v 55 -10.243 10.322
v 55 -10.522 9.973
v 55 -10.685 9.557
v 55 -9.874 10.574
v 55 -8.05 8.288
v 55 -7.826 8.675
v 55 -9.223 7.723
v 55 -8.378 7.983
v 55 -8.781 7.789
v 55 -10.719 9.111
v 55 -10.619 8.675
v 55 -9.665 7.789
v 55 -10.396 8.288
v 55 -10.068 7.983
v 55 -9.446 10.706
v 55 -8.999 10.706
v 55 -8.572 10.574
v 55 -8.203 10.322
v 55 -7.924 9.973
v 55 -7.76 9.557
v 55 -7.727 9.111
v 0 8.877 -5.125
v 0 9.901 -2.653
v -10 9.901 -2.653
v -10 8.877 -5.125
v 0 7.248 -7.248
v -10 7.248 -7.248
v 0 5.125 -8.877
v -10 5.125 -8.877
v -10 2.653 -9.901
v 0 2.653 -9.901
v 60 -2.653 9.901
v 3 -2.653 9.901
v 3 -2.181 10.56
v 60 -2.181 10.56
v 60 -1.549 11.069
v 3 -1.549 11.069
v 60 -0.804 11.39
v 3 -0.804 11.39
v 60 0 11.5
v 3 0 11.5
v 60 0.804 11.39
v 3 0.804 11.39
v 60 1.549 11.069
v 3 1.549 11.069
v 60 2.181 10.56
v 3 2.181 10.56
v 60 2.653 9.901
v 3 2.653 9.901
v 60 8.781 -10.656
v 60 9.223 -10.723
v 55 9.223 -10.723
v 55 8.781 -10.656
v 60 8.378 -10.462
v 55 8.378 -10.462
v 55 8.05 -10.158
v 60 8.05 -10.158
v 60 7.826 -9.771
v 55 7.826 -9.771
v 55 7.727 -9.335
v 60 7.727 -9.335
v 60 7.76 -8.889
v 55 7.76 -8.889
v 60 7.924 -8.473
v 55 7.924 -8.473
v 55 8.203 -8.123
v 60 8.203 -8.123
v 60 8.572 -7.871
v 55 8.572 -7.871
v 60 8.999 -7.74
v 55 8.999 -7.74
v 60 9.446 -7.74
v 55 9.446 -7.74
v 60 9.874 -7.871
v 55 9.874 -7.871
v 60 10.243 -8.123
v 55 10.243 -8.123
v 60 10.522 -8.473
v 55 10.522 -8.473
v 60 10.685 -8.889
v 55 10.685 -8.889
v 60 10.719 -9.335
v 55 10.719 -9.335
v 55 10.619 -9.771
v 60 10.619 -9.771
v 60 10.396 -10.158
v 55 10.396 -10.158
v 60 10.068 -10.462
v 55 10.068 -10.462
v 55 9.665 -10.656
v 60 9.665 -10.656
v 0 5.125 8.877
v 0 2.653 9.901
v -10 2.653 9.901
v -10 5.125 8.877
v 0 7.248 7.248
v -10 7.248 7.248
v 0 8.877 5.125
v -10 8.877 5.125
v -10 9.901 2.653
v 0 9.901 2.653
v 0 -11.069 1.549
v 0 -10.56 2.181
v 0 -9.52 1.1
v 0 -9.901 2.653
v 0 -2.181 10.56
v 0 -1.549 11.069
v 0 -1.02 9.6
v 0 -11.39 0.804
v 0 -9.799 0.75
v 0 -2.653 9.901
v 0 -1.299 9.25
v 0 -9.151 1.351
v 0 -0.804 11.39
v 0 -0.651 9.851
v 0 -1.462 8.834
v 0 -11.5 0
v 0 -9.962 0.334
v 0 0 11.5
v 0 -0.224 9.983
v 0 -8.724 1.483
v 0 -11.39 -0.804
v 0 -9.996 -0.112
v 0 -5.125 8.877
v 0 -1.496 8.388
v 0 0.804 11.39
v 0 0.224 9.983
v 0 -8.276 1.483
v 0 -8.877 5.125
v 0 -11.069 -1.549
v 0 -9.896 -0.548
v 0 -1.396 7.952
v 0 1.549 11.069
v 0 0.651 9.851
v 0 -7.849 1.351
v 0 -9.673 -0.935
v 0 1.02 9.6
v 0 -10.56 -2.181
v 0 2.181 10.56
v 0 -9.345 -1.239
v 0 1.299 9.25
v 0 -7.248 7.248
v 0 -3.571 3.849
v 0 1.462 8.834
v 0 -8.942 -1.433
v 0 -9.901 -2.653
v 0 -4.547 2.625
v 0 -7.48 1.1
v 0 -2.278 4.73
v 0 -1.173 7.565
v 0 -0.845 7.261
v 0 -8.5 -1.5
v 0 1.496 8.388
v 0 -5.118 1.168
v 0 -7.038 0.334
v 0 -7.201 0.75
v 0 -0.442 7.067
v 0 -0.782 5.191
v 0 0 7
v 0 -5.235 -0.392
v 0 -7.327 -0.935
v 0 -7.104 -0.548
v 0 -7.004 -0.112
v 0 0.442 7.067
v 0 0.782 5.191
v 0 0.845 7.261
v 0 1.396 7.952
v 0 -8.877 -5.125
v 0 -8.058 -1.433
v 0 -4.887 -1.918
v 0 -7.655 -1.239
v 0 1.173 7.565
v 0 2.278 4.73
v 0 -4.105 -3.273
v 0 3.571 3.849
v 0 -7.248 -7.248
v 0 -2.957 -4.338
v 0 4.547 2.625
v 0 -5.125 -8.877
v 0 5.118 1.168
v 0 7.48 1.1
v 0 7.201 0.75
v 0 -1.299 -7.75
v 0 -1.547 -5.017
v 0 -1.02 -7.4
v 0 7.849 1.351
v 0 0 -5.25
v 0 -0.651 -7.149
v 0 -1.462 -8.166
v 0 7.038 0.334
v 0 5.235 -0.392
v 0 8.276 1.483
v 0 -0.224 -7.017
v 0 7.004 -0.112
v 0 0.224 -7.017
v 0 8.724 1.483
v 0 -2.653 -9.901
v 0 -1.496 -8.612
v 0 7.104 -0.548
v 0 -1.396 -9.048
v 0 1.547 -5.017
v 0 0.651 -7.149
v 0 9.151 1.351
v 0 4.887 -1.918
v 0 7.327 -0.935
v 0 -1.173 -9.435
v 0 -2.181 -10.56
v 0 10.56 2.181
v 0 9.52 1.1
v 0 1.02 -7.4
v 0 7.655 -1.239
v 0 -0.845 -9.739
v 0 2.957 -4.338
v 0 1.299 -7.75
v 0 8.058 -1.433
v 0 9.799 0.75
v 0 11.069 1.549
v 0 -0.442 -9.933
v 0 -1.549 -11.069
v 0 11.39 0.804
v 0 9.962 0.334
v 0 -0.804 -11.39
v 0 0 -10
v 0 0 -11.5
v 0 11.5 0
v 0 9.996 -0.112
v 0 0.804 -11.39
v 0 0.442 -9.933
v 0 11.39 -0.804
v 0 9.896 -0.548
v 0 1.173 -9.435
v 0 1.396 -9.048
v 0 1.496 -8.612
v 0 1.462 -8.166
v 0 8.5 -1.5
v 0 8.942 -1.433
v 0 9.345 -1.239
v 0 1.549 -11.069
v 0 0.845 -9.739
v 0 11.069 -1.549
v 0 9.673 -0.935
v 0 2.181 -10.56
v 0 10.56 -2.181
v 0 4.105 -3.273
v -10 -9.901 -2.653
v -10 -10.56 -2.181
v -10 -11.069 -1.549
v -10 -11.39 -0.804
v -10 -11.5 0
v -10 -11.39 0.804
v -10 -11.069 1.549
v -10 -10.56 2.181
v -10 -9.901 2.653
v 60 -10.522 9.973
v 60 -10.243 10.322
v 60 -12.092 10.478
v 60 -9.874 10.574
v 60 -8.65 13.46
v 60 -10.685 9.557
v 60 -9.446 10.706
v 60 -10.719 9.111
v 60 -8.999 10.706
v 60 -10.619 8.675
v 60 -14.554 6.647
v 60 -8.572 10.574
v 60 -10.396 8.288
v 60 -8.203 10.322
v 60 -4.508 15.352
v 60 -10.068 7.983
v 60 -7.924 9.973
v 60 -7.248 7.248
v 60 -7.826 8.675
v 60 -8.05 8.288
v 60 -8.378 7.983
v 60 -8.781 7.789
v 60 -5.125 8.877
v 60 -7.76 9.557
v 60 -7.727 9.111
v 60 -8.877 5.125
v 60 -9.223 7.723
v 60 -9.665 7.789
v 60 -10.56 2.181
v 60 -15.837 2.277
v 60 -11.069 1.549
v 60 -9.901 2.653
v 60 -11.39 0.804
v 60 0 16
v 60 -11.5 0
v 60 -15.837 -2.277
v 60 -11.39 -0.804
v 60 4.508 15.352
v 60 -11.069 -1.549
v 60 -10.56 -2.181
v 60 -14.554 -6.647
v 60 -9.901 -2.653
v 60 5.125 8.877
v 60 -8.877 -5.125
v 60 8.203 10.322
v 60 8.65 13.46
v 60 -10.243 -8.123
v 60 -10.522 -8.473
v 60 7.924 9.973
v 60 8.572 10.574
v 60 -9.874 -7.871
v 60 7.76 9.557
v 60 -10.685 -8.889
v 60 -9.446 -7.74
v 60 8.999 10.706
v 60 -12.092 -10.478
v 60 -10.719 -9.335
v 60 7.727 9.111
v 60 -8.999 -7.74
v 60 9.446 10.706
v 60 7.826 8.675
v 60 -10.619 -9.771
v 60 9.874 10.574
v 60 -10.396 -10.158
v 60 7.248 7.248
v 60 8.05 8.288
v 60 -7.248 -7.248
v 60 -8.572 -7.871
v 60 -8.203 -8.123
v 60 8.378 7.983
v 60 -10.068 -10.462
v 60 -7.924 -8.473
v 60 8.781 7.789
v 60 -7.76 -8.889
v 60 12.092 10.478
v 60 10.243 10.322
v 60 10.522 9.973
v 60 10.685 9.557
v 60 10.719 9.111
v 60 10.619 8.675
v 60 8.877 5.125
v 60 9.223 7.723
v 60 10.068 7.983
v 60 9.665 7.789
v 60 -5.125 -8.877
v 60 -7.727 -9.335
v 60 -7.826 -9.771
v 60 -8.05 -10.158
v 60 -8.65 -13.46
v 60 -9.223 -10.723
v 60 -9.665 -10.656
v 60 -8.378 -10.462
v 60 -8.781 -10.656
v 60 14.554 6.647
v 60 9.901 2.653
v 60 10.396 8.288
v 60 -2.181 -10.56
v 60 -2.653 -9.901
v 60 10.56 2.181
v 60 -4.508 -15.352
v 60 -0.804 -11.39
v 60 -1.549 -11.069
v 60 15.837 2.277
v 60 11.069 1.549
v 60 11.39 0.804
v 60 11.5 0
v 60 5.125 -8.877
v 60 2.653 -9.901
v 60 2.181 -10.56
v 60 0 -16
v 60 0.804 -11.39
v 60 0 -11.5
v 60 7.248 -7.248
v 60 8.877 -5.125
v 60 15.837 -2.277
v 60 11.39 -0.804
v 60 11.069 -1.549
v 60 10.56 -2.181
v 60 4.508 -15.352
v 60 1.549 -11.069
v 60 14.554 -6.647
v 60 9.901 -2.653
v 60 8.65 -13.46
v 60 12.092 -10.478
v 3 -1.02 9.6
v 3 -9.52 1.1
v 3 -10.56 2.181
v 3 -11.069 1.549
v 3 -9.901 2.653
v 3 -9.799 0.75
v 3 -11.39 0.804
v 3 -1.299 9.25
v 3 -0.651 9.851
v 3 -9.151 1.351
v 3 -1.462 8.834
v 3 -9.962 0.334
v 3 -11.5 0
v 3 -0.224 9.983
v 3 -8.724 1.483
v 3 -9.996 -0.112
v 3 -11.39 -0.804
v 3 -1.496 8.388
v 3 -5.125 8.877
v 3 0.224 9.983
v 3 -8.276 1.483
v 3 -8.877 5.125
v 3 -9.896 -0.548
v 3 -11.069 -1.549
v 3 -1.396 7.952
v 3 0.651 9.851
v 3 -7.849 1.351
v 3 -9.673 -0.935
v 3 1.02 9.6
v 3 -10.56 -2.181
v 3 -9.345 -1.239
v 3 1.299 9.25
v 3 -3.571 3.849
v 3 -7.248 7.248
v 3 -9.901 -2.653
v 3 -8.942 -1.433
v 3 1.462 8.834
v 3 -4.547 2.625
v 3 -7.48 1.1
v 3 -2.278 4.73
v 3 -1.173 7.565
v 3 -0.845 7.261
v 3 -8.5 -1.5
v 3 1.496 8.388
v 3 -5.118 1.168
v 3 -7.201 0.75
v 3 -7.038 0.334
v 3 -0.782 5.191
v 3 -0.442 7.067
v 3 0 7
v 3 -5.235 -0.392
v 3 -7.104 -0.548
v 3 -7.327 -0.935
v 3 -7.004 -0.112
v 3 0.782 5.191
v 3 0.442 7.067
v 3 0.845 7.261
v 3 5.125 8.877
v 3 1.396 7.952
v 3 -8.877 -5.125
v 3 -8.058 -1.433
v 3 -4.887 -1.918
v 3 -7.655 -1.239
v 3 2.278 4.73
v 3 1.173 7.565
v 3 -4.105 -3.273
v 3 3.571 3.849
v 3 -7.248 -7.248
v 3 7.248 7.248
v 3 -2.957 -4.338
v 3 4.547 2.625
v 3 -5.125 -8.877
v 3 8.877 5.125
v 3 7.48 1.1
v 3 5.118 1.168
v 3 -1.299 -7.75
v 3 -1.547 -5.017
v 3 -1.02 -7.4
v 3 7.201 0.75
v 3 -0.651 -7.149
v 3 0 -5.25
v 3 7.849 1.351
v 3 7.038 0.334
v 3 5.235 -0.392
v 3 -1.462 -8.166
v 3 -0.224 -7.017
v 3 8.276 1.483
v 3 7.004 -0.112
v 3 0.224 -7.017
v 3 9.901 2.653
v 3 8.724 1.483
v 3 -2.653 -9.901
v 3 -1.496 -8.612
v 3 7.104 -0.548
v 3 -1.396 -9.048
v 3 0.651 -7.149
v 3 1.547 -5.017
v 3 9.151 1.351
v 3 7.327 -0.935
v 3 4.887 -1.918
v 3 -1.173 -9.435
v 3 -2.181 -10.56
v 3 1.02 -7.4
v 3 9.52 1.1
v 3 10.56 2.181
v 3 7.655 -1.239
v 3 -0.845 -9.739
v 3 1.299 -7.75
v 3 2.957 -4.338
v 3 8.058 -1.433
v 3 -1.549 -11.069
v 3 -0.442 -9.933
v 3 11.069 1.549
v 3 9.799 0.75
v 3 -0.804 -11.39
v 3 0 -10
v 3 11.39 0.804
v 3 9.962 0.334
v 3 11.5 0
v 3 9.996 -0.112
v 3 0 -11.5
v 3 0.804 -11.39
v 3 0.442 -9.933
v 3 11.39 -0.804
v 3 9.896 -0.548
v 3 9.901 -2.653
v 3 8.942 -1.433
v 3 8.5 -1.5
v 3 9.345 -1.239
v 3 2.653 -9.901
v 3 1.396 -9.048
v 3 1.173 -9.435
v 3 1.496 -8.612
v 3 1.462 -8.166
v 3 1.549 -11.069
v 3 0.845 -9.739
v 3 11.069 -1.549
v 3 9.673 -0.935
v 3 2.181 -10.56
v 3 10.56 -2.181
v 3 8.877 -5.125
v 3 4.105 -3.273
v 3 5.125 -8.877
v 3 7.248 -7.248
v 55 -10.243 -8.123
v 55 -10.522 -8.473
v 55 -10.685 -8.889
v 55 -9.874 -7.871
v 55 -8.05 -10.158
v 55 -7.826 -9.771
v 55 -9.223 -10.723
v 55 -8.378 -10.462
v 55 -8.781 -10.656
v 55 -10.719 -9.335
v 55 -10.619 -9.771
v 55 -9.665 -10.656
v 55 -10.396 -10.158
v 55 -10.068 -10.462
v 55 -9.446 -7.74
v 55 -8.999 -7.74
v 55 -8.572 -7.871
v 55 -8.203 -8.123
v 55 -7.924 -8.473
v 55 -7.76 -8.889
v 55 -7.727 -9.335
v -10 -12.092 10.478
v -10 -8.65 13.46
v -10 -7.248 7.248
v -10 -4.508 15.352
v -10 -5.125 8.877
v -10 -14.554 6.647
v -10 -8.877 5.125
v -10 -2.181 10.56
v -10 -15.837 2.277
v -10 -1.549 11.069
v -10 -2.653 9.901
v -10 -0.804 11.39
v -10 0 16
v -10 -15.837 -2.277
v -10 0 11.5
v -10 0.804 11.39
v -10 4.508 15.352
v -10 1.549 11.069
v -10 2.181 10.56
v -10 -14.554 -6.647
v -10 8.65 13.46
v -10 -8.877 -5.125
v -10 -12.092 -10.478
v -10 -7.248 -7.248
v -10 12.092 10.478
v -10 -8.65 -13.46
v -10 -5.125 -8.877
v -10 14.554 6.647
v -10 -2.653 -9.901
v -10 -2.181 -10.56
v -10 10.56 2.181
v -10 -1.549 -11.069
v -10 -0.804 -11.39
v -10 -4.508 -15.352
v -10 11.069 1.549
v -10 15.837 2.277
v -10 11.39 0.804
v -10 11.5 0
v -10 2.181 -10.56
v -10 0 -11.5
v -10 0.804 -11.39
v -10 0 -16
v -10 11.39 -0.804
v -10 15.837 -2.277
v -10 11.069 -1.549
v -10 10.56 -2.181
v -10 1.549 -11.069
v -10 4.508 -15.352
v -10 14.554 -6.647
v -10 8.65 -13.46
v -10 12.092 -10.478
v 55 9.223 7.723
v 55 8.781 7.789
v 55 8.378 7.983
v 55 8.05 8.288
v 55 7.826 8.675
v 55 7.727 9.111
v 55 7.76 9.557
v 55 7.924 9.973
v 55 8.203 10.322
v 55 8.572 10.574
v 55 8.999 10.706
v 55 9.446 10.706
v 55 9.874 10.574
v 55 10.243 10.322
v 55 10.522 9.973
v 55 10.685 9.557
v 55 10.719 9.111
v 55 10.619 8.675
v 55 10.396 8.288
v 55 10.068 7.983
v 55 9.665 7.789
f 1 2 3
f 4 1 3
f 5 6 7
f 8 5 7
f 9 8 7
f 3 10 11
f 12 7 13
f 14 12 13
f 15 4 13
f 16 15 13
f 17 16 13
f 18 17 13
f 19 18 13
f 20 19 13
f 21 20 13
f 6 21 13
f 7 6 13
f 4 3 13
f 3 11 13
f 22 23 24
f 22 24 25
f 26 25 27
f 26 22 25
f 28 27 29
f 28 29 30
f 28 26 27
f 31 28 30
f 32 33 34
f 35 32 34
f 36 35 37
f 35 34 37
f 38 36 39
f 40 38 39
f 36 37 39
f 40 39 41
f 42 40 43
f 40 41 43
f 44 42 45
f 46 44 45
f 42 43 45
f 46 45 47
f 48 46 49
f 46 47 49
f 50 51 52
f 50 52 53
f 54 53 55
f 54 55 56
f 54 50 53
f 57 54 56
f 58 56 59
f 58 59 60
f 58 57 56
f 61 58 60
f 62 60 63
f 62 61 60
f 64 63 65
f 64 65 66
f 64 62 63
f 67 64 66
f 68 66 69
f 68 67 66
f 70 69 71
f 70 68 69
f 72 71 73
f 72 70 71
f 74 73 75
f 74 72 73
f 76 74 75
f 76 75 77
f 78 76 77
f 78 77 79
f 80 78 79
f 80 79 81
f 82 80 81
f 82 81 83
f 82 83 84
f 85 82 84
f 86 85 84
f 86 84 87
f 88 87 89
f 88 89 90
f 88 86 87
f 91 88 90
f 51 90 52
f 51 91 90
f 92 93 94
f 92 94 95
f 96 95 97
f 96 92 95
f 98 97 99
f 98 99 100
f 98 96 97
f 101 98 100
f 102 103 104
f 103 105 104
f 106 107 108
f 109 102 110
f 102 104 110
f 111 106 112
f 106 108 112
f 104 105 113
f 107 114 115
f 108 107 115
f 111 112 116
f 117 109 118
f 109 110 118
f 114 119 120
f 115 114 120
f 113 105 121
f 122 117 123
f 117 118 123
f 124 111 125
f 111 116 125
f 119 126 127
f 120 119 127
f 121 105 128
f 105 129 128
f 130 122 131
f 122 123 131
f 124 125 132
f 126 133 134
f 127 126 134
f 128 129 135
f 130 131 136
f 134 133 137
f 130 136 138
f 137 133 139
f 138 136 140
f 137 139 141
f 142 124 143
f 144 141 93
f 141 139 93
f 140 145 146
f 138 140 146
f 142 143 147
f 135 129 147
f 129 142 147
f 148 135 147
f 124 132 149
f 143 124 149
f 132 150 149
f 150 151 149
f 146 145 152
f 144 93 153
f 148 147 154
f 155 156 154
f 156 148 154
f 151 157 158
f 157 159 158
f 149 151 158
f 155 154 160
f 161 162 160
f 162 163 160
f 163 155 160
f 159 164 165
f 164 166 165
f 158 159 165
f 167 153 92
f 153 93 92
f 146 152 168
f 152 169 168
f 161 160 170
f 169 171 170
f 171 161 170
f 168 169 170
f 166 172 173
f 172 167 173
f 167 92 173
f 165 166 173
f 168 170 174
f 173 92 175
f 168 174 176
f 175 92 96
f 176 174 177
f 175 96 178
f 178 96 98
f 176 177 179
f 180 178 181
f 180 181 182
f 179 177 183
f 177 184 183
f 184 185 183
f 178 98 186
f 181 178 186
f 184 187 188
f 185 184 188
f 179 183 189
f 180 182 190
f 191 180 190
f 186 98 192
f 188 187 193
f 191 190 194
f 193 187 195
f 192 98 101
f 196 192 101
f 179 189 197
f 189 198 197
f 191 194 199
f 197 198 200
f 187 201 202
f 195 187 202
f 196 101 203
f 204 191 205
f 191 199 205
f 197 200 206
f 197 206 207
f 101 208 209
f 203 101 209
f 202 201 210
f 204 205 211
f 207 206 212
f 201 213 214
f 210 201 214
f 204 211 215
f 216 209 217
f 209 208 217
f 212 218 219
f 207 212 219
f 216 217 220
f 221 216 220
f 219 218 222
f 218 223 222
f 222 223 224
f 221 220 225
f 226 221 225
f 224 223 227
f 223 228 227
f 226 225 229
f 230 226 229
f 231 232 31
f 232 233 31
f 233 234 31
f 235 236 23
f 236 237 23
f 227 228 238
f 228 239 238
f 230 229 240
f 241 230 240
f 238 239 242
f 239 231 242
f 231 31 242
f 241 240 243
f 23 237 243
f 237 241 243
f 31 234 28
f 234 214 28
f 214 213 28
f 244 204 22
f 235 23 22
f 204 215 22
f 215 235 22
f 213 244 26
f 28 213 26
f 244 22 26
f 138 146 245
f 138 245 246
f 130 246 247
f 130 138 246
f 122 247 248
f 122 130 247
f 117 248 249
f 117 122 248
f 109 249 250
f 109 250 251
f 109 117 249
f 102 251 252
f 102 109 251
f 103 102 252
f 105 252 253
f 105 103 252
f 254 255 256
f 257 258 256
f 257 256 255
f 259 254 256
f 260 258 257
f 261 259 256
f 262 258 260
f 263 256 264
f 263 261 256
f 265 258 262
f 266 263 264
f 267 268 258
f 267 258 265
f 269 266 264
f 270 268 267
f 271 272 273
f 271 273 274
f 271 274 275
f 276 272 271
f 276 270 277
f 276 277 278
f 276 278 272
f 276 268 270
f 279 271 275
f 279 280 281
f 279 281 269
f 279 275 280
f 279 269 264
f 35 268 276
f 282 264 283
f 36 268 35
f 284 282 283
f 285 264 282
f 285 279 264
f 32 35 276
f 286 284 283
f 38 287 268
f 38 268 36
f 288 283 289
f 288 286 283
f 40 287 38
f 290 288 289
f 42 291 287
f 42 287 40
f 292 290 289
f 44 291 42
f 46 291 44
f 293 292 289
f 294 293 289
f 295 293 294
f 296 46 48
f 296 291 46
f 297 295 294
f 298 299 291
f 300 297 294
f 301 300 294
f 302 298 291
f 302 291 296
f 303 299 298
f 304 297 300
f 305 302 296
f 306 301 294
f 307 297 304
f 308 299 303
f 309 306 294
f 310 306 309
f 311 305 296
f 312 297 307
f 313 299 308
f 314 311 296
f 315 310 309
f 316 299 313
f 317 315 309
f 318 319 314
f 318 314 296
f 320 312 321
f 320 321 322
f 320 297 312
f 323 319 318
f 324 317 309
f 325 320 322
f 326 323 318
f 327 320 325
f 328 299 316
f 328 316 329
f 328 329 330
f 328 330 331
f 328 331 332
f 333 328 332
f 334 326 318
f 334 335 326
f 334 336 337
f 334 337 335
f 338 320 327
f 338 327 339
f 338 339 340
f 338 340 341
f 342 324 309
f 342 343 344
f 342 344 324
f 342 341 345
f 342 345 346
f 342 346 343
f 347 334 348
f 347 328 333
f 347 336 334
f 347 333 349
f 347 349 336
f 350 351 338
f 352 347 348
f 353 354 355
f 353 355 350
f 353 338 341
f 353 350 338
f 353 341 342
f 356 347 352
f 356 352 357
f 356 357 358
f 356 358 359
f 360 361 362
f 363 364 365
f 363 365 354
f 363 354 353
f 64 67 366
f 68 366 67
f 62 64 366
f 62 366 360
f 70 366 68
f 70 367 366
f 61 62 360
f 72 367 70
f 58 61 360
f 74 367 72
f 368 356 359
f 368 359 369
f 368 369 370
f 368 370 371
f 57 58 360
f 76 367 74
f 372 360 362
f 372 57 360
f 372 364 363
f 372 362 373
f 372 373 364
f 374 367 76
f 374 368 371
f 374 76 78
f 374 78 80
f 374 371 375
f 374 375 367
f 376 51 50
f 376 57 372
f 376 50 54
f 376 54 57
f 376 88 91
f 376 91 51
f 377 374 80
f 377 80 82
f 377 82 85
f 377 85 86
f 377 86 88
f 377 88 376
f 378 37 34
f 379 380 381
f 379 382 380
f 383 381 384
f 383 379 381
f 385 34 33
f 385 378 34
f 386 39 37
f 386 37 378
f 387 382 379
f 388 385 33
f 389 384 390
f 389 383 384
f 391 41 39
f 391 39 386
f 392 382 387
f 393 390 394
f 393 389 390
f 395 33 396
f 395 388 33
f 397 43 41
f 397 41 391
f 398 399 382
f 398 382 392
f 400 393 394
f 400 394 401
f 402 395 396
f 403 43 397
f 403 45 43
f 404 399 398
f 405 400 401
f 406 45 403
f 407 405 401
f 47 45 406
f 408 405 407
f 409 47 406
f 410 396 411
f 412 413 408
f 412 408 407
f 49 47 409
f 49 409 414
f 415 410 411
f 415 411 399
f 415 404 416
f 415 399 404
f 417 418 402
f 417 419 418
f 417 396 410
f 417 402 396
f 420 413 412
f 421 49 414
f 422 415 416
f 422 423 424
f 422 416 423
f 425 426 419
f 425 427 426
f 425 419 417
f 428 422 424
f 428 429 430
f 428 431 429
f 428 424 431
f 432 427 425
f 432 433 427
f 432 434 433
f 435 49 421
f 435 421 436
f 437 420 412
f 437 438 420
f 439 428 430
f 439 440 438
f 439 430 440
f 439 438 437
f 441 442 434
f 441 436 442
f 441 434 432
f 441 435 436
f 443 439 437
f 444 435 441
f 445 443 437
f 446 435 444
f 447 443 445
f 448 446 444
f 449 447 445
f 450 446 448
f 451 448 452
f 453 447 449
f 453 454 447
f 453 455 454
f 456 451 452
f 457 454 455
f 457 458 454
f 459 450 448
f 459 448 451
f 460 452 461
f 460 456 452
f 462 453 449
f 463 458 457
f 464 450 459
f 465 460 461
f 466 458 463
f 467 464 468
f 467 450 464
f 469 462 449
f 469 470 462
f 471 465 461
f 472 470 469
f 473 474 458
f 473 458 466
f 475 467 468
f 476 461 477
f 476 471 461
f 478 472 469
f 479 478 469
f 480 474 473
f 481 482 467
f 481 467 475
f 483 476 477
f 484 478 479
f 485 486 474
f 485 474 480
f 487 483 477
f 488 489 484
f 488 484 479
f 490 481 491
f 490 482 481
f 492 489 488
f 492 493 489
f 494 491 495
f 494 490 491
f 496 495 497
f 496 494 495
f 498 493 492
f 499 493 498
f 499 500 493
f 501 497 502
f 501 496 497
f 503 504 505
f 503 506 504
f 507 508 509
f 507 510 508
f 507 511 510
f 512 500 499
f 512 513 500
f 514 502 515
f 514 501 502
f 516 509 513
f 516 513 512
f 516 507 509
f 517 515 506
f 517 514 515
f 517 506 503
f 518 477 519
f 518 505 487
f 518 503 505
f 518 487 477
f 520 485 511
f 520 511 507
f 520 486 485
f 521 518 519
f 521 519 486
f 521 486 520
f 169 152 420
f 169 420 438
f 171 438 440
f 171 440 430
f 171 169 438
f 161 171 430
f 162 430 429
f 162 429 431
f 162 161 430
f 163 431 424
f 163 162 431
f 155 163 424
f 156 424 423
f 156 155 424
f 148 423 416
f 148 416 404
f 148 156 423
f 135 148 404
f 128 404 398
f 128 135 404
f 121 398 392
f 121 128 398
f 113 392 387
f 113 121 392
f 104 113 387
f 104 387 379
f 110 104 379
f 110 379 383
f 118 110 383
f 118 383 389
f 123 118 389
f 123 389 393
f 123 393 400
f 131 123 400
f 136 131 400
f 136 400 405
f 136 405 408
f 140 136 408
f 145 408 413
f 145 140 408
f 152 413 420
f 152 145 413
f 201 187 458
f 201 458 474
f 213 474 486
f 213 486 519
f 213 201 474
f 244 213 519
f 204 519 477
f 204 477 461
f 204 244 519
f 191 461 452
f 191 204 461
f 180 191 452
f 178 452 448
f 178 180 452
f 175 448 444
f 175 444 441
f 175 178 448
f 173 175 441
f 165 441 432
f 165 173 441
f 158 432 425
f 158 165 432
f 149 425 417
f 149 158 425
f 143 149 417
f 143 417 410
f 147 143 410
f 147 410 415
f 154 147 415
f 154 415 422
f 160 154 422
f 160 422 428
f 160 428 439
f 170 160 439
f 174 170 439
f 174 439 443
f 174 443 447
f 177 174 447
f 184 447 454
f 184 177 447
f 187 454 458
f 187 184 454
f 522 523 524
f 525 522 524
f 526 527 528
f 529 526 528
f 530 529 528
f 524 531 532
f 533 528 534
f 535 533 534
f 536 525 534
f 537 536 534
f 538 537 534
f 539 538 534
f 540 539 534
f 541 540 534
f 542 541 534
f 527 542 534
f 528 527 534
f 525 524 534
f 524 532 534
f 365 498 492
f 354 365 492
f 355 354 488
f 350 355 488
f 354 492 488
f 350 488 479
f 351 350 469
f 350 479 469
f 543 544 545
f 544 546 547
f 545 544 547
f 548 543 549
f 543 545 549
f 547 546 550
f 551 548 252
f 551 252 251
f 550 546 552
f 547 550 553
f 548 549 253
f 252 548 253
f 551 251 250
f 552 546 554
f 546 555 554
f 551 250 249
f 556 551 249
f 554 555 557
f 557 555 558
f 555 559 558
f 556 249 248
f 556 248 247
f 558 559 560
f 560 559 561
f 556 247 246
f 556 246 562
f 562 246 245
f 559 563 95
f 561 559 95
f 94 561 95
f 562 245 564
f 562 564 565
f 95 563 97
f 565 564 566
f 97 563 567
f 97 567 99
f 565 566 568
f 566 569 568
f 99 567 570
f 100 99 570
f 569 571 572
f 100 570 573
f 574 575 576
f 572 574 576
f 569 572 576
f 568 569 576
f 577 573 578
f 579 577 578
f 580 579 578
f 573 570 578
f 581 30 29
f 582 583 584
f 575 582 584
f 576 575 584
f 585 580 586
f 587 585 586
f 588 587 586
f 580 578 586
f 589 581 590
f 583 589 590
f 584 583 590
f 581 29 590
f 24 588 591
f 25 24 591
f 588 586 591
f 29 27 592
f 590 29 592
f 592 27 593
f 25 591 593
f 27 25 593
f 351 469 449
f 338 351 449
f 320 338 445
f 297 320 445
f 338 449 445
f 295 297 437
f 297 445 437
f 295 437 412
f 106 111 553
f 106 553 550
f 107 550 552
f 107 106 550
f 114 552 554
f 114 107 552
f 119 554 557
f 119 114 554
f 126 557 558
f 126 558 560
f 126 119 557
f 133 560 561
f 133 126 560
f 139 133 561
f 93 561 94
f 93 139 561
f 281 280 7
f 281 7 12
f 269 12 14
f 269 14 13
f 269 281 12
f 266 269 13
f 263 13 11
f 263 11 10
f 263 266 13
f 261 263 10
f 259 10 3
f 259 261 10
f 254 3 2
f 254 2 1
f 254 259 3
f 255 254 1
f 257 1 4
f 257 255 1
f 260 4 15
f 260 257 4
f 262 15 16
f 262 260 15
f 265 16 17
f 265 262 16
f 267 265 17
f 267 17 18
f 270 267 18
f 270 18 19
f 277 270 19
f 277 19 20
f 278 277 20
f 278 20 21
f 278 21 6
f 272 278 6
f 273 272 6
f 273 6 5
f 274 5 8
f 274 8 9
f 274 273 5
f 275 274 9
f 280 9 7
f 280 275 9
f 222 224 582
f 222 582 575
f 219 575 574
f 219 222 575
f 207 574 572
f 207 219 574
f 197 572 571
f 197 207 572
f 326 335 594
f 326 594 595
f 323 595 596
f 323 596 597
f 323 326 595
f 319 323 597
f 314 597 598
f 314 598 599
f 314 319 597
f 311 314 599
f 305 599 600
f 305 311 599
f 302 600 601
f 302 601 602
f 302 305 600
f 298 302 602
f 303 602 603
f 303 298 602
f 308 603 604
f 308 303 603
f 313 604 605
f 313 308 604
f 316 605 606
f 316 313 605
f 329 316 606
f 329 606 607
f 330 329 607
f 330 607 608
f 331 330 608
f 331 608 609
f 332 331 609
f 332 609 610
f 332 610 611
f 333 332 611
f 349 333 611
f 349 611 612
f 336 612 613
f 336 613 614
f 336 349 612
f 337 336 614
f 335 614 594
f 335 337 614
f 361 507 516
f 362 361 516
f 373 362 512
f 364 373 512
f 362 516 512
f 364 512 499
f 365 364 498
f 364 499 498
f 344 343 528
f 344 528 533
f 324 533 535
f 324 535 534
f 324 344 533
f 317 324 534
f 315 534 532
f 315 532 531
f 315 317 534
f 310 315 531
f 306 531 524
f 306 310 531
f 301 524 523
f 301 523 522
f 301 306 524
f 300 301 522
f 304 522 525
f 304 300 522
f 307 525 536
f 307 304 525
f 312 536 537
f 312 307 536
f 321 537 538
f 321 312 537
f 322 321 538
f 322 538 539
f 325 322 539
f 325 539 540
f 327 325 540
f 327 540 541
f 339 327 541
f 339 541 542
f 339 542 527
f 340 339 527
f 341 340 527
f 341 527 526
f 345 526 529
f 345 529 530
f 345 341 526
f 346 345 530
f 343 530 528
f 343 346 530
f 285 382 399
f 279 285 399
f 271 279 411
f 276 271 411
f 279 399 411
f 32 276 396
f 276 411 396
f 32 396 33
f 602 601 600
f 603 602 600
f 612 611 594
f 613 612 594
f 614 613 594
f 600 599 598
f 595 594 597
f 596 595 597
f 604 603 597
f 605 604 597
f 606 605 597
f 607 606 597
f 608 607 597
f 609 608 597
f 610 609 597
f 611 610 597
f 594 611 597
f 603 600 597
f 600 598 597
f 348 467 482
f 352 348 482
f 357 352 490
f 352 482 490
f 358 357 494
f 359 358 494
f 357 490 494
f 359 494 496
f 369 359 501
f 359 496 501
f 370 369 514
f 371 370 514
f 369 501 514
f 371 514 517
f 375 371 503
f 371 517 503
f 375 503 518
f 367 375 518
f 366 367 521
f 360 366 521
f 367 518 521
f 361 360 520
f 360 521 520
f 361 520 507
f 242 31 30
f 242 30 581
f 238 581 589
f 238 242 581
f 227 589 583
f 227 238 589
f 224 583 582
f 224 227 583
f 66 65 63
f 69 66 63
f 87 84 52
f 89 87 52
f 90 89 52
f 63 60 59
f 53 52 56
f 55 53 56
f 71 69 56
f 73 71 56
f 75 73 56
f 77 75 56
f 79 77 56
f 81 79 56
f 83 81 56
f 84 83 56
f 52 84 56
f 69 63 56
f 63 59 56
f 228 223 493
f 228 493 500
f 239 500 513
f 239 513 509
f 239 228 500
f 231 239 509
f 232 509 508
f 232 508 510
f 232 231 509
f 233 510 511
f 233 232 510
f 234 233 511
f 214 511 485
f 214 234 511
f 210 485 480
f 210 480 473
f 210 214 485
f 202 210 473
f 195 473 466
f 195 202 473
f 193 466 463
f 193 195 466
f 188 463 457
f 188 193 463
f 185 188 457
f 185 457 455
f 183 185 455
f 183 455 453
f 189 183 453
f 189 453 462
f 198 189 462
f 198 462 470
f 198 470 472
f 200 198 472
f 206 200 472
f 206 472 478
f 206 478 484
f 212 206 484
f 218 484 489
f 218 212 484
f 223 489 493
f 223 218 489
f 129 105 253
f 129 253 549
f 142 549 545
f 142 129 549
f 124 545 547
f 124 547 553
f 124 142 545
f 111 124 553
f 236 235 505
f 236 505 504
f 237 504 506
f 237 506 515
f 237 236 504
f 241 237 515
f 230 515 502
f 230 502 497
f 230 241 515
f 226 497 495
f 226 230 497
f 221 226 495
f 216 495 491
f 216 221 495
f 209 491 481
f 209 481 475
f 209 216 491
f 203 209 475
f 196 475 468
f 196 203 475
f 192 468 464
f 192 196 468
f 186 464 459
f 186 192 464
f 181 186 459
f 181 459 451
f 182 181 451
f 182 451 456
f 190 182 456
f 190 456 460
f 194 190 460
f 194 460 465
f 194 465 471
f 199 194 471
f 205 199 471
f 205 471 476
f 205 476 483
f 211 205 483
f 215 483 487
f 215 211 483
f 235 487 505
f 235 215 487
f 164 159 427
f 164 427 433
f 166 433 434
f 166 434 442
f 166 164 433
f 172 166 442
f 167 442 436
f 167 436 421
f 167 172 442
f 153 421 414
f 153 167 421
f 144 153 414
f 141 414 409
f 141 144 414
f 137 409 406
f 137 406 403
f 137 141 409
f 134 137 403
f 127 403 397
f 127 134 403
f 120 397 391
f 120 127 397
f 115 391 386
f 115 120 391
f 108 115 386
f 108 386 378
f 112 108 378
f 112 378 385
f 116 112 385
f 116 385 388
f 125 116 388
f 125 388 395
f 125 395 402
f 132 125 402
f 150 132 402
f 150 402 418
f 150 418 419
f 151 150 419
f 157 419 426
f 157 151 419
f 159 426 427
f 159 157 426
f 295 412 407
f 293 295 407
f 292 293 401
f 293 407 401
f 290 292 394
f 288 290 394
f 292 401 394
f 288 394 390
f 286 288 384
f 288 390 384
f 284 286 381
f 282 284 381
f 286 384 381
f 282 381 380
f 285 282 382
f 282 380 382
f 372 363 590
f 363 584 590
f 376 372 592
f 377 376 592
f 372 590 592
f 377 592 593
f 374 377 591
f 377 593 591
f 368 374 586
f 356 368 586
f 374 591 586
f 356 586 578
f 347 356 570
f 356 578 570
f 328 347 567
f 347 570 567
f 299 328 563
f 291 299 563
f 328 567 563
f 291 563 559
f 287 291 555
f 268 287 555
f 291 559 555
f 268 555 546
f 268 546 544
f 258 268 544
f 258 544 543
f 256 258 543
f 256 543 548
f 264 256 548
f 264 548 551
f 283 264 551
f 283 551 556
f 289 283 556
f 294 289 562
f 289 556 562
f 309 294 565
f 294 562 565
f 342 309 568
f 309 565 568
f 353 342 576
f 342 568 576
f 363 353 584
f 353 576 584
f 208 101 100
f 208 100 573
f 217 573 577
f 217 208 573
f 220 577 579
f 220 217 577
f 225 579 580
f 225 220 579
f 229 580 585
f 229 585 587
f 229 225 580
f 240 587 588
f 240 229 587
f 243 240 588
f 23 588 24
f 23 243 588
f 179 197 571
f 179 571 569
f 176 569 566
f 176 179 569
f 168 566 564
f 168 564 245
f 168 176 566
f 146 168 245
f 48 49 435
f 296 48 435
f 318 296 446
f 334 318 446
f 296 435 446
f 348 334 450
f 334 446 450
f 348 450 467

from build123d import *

# Parameters (mm, degrees)
SKETCH1_R           = 16
SKETCH1_R_2         = 1.5
SKETCH1_R_3         = 5.25
SKETCH1_R_4         = 3
BOSS_EXTRUDE2_DEPTH = 3
SKETCH1_8_R         = 16
BOSS_EXTRUDE4_DEPTH = 10
SKETCH1_10_R        = 3
SKETCH1_10_R_2      = 1.5
BOSS_EXTRUDE6_DEPTH = 3
BOSS_EXTRUDE7_START = 3
SKETCH1_11_R        = 16
BOSS_EXTRUDE7_DEPTH = 57
CUT_EXTRUDE2_START  = -70
SKETCH2_R           = 1.5
CUT_EXTRUDE2_DEPTH  = 5


with BuildPart() as part:
    # Sketch1 → Boss-Extrude2 (new body)
    with BuildSketch(Plane(origin=(0, 0, 0), x_dir=(0, 0, -1), z_dir=(1, 0, 0))):
        Circle(SKETCH1_R)
        with Locations((0, 8.5)):
            Circle(SKETCH1_R_2, mode=Mode.SUBTRACT)
        with Locations((0, -8.5)):
            Circle(SKETCH1_R_2, mode=Mode.SUBTRACT)
        Circle(SKETCH1_R_3, mode=Mode.SUBTRACT)
        with Locations((8.5, 0)):
            Circle(SKETCH1_R_4, mode=Mode.SUBTRACT)
        with Locations((-8.5, 0)):
            Circle(SKETCH1_R_4, mode=Mode.SUBTRACT)
    extrude(amount=BOSS_EXTRUDE2_DEPTH)

    # Sketch1<8> → Boss-Extrude4 (add)
    with BuildSketch(Plane(origin=(0, 0, 0), x_dir=(0, 0, -1), z_dir=(1, 0, 0))):
        Circle(SKETCH1_8_R)
        with BuildLine():
            ThreePointArc((2.652911728, 9.900735294), (7.247844507, 7.247844507), (9.900735294, 2.652911728))
            ThreePointArc((9.900735294, 2.652911728), (11.069261166, 1.548837325), (11.5, 0))
            ThreePointArc((11.5, 0), (11.069261166, -1.548837325), (9.900735294, -2.652911728))
            ThreePointArc((9.900735294, -2.652911728), (7.247844507, -7.247844507), (2.652911728, -9.900735294))
            ThreePointArc((2.652911728, -9.900735294), (0, -11.5), (-2.652911728, -9.900735294))
            ThreePointArc((-2.652911728, -9.900735294), (-7.247844507, -7.247844507), (-9.900735294, -2.652911728))
            ThreePointArc((-9.900735294, -2.652911728), (-11.5, 0), (-9.900735294, 2.652911728))
            ThreePointArc((-9.900735294, 2.652911728), (-7.247844507, 7.247844507), (-2.652911728, 9.900735294))
            ThreePointArc((-2.652911728, 9.900735294), (0, 11.5), (2.652911728, 9.900735294))
        make_face(mode=Mode.SUBTRACT)
    extrude(amount=-BOSS_EXTRUDE4_DEPTH)

    # Sketch1<10> → Boss-Extrude6 (add)
    with BuildSketch(Plane(origin=(0, 0, 0), x_dir=(0, 0, -1), z_dir=(1, 0, 0))):
        with Locations((8.5, 0)):
            Circle(SKETCH1_10_R)
        with Locations((8.5, 0)):
            Circle(SKETCH1_10_R_2, mode=Mode.SUBTRACT)
        with Locations((-8.5, 0)):
            Circle(SKETCH1_10_R)
        with Locations((-8.5, 0)):
            Circle(SKETCH1_10_R_2, mode=Mode.SUBTRACT)
    extrude(amount=BOSS_EXTRUDE6_DEPTH)

    # Sketch1<11> → Boss-Extrude7 (add)
    with BuildSketch(Plane(origin=(0, 0, 0), x_dir=(0, 0, -1), z_dir=(1, 0, 0)).offset(BOSS_EXTRUDE7_START)):
        Circle(SKETCH1_11_R)
        with BuildLine():
            ThreePointArc((2.652911728, 9.900735294), (7.247844507, 7.247844507), (9.900735294, 2.652911728))
            ThreePointArc((9.900735294, 2.652911728), (11.069261166, 1.548837325), (11.5, 0))
            ThreePointArc((11.5, 0), (11.069261166, -1.548837325), (9.900735294, -2.652911728))
            ThreePointArc((9.900735294, -2.652911728), (7.247844507, -7.247844507), (2.652911728, -9.900735294))
            ThreePointArc((2.652911728, -9.900735294), (0, -11.5), (-2.652911728, -9.900735294))
            ThreePointArc((-2.652911728, -9.900735294), (-7.247844507, -7.247844507), (-9.900735294, -2.652911728))
            ThreePointArc((-9.900735294, -2.652911728), (-11.5, 0), (-9.900735294, 2.652911728))
            ThreePointArc((-9.900735294, 2.652911728), (-7.247844507, 7.247844507), (-2.652911728, 9.900735294))
            ThreePointArc((-2.652911728, 9.900735294), (0, 11.5), (2.652911728, 9.900735294))
        make_face(mode=Mode.SUBTRACT)
    extrude(amount=BOSS_EXTRUDE7_DEPTH)

    # Sketch2 → Cut-Extrude2 (cut)
    with BuildSketch(Plane.ZY.offset(10).offset(CUT_EXTRUDE2_START)):
        with Locations(Location((9.222798741, 9.222798741, 0), (0, 0, 180))):
            Circle(SKETCH2_R)
        with Locations(Location((-9.222798741, 9.222798741, 0), (0, 0, 180))):
            Circle(SKETCH2_R)
        with Locations(Location((9.222798741, -9.222798741, 0), (0, 0, 180))):
            Circle(SKETCH2_R)
        with Locations(Location((-9.222798741, -9.222798741, 0), (0, 0, 180))):
            Circle(SKETCH2_R)
    extrude(amount=CUT_EXTRUDE2_DEPTH, mode=Mode.SUBTRACT)


solid = part.part
